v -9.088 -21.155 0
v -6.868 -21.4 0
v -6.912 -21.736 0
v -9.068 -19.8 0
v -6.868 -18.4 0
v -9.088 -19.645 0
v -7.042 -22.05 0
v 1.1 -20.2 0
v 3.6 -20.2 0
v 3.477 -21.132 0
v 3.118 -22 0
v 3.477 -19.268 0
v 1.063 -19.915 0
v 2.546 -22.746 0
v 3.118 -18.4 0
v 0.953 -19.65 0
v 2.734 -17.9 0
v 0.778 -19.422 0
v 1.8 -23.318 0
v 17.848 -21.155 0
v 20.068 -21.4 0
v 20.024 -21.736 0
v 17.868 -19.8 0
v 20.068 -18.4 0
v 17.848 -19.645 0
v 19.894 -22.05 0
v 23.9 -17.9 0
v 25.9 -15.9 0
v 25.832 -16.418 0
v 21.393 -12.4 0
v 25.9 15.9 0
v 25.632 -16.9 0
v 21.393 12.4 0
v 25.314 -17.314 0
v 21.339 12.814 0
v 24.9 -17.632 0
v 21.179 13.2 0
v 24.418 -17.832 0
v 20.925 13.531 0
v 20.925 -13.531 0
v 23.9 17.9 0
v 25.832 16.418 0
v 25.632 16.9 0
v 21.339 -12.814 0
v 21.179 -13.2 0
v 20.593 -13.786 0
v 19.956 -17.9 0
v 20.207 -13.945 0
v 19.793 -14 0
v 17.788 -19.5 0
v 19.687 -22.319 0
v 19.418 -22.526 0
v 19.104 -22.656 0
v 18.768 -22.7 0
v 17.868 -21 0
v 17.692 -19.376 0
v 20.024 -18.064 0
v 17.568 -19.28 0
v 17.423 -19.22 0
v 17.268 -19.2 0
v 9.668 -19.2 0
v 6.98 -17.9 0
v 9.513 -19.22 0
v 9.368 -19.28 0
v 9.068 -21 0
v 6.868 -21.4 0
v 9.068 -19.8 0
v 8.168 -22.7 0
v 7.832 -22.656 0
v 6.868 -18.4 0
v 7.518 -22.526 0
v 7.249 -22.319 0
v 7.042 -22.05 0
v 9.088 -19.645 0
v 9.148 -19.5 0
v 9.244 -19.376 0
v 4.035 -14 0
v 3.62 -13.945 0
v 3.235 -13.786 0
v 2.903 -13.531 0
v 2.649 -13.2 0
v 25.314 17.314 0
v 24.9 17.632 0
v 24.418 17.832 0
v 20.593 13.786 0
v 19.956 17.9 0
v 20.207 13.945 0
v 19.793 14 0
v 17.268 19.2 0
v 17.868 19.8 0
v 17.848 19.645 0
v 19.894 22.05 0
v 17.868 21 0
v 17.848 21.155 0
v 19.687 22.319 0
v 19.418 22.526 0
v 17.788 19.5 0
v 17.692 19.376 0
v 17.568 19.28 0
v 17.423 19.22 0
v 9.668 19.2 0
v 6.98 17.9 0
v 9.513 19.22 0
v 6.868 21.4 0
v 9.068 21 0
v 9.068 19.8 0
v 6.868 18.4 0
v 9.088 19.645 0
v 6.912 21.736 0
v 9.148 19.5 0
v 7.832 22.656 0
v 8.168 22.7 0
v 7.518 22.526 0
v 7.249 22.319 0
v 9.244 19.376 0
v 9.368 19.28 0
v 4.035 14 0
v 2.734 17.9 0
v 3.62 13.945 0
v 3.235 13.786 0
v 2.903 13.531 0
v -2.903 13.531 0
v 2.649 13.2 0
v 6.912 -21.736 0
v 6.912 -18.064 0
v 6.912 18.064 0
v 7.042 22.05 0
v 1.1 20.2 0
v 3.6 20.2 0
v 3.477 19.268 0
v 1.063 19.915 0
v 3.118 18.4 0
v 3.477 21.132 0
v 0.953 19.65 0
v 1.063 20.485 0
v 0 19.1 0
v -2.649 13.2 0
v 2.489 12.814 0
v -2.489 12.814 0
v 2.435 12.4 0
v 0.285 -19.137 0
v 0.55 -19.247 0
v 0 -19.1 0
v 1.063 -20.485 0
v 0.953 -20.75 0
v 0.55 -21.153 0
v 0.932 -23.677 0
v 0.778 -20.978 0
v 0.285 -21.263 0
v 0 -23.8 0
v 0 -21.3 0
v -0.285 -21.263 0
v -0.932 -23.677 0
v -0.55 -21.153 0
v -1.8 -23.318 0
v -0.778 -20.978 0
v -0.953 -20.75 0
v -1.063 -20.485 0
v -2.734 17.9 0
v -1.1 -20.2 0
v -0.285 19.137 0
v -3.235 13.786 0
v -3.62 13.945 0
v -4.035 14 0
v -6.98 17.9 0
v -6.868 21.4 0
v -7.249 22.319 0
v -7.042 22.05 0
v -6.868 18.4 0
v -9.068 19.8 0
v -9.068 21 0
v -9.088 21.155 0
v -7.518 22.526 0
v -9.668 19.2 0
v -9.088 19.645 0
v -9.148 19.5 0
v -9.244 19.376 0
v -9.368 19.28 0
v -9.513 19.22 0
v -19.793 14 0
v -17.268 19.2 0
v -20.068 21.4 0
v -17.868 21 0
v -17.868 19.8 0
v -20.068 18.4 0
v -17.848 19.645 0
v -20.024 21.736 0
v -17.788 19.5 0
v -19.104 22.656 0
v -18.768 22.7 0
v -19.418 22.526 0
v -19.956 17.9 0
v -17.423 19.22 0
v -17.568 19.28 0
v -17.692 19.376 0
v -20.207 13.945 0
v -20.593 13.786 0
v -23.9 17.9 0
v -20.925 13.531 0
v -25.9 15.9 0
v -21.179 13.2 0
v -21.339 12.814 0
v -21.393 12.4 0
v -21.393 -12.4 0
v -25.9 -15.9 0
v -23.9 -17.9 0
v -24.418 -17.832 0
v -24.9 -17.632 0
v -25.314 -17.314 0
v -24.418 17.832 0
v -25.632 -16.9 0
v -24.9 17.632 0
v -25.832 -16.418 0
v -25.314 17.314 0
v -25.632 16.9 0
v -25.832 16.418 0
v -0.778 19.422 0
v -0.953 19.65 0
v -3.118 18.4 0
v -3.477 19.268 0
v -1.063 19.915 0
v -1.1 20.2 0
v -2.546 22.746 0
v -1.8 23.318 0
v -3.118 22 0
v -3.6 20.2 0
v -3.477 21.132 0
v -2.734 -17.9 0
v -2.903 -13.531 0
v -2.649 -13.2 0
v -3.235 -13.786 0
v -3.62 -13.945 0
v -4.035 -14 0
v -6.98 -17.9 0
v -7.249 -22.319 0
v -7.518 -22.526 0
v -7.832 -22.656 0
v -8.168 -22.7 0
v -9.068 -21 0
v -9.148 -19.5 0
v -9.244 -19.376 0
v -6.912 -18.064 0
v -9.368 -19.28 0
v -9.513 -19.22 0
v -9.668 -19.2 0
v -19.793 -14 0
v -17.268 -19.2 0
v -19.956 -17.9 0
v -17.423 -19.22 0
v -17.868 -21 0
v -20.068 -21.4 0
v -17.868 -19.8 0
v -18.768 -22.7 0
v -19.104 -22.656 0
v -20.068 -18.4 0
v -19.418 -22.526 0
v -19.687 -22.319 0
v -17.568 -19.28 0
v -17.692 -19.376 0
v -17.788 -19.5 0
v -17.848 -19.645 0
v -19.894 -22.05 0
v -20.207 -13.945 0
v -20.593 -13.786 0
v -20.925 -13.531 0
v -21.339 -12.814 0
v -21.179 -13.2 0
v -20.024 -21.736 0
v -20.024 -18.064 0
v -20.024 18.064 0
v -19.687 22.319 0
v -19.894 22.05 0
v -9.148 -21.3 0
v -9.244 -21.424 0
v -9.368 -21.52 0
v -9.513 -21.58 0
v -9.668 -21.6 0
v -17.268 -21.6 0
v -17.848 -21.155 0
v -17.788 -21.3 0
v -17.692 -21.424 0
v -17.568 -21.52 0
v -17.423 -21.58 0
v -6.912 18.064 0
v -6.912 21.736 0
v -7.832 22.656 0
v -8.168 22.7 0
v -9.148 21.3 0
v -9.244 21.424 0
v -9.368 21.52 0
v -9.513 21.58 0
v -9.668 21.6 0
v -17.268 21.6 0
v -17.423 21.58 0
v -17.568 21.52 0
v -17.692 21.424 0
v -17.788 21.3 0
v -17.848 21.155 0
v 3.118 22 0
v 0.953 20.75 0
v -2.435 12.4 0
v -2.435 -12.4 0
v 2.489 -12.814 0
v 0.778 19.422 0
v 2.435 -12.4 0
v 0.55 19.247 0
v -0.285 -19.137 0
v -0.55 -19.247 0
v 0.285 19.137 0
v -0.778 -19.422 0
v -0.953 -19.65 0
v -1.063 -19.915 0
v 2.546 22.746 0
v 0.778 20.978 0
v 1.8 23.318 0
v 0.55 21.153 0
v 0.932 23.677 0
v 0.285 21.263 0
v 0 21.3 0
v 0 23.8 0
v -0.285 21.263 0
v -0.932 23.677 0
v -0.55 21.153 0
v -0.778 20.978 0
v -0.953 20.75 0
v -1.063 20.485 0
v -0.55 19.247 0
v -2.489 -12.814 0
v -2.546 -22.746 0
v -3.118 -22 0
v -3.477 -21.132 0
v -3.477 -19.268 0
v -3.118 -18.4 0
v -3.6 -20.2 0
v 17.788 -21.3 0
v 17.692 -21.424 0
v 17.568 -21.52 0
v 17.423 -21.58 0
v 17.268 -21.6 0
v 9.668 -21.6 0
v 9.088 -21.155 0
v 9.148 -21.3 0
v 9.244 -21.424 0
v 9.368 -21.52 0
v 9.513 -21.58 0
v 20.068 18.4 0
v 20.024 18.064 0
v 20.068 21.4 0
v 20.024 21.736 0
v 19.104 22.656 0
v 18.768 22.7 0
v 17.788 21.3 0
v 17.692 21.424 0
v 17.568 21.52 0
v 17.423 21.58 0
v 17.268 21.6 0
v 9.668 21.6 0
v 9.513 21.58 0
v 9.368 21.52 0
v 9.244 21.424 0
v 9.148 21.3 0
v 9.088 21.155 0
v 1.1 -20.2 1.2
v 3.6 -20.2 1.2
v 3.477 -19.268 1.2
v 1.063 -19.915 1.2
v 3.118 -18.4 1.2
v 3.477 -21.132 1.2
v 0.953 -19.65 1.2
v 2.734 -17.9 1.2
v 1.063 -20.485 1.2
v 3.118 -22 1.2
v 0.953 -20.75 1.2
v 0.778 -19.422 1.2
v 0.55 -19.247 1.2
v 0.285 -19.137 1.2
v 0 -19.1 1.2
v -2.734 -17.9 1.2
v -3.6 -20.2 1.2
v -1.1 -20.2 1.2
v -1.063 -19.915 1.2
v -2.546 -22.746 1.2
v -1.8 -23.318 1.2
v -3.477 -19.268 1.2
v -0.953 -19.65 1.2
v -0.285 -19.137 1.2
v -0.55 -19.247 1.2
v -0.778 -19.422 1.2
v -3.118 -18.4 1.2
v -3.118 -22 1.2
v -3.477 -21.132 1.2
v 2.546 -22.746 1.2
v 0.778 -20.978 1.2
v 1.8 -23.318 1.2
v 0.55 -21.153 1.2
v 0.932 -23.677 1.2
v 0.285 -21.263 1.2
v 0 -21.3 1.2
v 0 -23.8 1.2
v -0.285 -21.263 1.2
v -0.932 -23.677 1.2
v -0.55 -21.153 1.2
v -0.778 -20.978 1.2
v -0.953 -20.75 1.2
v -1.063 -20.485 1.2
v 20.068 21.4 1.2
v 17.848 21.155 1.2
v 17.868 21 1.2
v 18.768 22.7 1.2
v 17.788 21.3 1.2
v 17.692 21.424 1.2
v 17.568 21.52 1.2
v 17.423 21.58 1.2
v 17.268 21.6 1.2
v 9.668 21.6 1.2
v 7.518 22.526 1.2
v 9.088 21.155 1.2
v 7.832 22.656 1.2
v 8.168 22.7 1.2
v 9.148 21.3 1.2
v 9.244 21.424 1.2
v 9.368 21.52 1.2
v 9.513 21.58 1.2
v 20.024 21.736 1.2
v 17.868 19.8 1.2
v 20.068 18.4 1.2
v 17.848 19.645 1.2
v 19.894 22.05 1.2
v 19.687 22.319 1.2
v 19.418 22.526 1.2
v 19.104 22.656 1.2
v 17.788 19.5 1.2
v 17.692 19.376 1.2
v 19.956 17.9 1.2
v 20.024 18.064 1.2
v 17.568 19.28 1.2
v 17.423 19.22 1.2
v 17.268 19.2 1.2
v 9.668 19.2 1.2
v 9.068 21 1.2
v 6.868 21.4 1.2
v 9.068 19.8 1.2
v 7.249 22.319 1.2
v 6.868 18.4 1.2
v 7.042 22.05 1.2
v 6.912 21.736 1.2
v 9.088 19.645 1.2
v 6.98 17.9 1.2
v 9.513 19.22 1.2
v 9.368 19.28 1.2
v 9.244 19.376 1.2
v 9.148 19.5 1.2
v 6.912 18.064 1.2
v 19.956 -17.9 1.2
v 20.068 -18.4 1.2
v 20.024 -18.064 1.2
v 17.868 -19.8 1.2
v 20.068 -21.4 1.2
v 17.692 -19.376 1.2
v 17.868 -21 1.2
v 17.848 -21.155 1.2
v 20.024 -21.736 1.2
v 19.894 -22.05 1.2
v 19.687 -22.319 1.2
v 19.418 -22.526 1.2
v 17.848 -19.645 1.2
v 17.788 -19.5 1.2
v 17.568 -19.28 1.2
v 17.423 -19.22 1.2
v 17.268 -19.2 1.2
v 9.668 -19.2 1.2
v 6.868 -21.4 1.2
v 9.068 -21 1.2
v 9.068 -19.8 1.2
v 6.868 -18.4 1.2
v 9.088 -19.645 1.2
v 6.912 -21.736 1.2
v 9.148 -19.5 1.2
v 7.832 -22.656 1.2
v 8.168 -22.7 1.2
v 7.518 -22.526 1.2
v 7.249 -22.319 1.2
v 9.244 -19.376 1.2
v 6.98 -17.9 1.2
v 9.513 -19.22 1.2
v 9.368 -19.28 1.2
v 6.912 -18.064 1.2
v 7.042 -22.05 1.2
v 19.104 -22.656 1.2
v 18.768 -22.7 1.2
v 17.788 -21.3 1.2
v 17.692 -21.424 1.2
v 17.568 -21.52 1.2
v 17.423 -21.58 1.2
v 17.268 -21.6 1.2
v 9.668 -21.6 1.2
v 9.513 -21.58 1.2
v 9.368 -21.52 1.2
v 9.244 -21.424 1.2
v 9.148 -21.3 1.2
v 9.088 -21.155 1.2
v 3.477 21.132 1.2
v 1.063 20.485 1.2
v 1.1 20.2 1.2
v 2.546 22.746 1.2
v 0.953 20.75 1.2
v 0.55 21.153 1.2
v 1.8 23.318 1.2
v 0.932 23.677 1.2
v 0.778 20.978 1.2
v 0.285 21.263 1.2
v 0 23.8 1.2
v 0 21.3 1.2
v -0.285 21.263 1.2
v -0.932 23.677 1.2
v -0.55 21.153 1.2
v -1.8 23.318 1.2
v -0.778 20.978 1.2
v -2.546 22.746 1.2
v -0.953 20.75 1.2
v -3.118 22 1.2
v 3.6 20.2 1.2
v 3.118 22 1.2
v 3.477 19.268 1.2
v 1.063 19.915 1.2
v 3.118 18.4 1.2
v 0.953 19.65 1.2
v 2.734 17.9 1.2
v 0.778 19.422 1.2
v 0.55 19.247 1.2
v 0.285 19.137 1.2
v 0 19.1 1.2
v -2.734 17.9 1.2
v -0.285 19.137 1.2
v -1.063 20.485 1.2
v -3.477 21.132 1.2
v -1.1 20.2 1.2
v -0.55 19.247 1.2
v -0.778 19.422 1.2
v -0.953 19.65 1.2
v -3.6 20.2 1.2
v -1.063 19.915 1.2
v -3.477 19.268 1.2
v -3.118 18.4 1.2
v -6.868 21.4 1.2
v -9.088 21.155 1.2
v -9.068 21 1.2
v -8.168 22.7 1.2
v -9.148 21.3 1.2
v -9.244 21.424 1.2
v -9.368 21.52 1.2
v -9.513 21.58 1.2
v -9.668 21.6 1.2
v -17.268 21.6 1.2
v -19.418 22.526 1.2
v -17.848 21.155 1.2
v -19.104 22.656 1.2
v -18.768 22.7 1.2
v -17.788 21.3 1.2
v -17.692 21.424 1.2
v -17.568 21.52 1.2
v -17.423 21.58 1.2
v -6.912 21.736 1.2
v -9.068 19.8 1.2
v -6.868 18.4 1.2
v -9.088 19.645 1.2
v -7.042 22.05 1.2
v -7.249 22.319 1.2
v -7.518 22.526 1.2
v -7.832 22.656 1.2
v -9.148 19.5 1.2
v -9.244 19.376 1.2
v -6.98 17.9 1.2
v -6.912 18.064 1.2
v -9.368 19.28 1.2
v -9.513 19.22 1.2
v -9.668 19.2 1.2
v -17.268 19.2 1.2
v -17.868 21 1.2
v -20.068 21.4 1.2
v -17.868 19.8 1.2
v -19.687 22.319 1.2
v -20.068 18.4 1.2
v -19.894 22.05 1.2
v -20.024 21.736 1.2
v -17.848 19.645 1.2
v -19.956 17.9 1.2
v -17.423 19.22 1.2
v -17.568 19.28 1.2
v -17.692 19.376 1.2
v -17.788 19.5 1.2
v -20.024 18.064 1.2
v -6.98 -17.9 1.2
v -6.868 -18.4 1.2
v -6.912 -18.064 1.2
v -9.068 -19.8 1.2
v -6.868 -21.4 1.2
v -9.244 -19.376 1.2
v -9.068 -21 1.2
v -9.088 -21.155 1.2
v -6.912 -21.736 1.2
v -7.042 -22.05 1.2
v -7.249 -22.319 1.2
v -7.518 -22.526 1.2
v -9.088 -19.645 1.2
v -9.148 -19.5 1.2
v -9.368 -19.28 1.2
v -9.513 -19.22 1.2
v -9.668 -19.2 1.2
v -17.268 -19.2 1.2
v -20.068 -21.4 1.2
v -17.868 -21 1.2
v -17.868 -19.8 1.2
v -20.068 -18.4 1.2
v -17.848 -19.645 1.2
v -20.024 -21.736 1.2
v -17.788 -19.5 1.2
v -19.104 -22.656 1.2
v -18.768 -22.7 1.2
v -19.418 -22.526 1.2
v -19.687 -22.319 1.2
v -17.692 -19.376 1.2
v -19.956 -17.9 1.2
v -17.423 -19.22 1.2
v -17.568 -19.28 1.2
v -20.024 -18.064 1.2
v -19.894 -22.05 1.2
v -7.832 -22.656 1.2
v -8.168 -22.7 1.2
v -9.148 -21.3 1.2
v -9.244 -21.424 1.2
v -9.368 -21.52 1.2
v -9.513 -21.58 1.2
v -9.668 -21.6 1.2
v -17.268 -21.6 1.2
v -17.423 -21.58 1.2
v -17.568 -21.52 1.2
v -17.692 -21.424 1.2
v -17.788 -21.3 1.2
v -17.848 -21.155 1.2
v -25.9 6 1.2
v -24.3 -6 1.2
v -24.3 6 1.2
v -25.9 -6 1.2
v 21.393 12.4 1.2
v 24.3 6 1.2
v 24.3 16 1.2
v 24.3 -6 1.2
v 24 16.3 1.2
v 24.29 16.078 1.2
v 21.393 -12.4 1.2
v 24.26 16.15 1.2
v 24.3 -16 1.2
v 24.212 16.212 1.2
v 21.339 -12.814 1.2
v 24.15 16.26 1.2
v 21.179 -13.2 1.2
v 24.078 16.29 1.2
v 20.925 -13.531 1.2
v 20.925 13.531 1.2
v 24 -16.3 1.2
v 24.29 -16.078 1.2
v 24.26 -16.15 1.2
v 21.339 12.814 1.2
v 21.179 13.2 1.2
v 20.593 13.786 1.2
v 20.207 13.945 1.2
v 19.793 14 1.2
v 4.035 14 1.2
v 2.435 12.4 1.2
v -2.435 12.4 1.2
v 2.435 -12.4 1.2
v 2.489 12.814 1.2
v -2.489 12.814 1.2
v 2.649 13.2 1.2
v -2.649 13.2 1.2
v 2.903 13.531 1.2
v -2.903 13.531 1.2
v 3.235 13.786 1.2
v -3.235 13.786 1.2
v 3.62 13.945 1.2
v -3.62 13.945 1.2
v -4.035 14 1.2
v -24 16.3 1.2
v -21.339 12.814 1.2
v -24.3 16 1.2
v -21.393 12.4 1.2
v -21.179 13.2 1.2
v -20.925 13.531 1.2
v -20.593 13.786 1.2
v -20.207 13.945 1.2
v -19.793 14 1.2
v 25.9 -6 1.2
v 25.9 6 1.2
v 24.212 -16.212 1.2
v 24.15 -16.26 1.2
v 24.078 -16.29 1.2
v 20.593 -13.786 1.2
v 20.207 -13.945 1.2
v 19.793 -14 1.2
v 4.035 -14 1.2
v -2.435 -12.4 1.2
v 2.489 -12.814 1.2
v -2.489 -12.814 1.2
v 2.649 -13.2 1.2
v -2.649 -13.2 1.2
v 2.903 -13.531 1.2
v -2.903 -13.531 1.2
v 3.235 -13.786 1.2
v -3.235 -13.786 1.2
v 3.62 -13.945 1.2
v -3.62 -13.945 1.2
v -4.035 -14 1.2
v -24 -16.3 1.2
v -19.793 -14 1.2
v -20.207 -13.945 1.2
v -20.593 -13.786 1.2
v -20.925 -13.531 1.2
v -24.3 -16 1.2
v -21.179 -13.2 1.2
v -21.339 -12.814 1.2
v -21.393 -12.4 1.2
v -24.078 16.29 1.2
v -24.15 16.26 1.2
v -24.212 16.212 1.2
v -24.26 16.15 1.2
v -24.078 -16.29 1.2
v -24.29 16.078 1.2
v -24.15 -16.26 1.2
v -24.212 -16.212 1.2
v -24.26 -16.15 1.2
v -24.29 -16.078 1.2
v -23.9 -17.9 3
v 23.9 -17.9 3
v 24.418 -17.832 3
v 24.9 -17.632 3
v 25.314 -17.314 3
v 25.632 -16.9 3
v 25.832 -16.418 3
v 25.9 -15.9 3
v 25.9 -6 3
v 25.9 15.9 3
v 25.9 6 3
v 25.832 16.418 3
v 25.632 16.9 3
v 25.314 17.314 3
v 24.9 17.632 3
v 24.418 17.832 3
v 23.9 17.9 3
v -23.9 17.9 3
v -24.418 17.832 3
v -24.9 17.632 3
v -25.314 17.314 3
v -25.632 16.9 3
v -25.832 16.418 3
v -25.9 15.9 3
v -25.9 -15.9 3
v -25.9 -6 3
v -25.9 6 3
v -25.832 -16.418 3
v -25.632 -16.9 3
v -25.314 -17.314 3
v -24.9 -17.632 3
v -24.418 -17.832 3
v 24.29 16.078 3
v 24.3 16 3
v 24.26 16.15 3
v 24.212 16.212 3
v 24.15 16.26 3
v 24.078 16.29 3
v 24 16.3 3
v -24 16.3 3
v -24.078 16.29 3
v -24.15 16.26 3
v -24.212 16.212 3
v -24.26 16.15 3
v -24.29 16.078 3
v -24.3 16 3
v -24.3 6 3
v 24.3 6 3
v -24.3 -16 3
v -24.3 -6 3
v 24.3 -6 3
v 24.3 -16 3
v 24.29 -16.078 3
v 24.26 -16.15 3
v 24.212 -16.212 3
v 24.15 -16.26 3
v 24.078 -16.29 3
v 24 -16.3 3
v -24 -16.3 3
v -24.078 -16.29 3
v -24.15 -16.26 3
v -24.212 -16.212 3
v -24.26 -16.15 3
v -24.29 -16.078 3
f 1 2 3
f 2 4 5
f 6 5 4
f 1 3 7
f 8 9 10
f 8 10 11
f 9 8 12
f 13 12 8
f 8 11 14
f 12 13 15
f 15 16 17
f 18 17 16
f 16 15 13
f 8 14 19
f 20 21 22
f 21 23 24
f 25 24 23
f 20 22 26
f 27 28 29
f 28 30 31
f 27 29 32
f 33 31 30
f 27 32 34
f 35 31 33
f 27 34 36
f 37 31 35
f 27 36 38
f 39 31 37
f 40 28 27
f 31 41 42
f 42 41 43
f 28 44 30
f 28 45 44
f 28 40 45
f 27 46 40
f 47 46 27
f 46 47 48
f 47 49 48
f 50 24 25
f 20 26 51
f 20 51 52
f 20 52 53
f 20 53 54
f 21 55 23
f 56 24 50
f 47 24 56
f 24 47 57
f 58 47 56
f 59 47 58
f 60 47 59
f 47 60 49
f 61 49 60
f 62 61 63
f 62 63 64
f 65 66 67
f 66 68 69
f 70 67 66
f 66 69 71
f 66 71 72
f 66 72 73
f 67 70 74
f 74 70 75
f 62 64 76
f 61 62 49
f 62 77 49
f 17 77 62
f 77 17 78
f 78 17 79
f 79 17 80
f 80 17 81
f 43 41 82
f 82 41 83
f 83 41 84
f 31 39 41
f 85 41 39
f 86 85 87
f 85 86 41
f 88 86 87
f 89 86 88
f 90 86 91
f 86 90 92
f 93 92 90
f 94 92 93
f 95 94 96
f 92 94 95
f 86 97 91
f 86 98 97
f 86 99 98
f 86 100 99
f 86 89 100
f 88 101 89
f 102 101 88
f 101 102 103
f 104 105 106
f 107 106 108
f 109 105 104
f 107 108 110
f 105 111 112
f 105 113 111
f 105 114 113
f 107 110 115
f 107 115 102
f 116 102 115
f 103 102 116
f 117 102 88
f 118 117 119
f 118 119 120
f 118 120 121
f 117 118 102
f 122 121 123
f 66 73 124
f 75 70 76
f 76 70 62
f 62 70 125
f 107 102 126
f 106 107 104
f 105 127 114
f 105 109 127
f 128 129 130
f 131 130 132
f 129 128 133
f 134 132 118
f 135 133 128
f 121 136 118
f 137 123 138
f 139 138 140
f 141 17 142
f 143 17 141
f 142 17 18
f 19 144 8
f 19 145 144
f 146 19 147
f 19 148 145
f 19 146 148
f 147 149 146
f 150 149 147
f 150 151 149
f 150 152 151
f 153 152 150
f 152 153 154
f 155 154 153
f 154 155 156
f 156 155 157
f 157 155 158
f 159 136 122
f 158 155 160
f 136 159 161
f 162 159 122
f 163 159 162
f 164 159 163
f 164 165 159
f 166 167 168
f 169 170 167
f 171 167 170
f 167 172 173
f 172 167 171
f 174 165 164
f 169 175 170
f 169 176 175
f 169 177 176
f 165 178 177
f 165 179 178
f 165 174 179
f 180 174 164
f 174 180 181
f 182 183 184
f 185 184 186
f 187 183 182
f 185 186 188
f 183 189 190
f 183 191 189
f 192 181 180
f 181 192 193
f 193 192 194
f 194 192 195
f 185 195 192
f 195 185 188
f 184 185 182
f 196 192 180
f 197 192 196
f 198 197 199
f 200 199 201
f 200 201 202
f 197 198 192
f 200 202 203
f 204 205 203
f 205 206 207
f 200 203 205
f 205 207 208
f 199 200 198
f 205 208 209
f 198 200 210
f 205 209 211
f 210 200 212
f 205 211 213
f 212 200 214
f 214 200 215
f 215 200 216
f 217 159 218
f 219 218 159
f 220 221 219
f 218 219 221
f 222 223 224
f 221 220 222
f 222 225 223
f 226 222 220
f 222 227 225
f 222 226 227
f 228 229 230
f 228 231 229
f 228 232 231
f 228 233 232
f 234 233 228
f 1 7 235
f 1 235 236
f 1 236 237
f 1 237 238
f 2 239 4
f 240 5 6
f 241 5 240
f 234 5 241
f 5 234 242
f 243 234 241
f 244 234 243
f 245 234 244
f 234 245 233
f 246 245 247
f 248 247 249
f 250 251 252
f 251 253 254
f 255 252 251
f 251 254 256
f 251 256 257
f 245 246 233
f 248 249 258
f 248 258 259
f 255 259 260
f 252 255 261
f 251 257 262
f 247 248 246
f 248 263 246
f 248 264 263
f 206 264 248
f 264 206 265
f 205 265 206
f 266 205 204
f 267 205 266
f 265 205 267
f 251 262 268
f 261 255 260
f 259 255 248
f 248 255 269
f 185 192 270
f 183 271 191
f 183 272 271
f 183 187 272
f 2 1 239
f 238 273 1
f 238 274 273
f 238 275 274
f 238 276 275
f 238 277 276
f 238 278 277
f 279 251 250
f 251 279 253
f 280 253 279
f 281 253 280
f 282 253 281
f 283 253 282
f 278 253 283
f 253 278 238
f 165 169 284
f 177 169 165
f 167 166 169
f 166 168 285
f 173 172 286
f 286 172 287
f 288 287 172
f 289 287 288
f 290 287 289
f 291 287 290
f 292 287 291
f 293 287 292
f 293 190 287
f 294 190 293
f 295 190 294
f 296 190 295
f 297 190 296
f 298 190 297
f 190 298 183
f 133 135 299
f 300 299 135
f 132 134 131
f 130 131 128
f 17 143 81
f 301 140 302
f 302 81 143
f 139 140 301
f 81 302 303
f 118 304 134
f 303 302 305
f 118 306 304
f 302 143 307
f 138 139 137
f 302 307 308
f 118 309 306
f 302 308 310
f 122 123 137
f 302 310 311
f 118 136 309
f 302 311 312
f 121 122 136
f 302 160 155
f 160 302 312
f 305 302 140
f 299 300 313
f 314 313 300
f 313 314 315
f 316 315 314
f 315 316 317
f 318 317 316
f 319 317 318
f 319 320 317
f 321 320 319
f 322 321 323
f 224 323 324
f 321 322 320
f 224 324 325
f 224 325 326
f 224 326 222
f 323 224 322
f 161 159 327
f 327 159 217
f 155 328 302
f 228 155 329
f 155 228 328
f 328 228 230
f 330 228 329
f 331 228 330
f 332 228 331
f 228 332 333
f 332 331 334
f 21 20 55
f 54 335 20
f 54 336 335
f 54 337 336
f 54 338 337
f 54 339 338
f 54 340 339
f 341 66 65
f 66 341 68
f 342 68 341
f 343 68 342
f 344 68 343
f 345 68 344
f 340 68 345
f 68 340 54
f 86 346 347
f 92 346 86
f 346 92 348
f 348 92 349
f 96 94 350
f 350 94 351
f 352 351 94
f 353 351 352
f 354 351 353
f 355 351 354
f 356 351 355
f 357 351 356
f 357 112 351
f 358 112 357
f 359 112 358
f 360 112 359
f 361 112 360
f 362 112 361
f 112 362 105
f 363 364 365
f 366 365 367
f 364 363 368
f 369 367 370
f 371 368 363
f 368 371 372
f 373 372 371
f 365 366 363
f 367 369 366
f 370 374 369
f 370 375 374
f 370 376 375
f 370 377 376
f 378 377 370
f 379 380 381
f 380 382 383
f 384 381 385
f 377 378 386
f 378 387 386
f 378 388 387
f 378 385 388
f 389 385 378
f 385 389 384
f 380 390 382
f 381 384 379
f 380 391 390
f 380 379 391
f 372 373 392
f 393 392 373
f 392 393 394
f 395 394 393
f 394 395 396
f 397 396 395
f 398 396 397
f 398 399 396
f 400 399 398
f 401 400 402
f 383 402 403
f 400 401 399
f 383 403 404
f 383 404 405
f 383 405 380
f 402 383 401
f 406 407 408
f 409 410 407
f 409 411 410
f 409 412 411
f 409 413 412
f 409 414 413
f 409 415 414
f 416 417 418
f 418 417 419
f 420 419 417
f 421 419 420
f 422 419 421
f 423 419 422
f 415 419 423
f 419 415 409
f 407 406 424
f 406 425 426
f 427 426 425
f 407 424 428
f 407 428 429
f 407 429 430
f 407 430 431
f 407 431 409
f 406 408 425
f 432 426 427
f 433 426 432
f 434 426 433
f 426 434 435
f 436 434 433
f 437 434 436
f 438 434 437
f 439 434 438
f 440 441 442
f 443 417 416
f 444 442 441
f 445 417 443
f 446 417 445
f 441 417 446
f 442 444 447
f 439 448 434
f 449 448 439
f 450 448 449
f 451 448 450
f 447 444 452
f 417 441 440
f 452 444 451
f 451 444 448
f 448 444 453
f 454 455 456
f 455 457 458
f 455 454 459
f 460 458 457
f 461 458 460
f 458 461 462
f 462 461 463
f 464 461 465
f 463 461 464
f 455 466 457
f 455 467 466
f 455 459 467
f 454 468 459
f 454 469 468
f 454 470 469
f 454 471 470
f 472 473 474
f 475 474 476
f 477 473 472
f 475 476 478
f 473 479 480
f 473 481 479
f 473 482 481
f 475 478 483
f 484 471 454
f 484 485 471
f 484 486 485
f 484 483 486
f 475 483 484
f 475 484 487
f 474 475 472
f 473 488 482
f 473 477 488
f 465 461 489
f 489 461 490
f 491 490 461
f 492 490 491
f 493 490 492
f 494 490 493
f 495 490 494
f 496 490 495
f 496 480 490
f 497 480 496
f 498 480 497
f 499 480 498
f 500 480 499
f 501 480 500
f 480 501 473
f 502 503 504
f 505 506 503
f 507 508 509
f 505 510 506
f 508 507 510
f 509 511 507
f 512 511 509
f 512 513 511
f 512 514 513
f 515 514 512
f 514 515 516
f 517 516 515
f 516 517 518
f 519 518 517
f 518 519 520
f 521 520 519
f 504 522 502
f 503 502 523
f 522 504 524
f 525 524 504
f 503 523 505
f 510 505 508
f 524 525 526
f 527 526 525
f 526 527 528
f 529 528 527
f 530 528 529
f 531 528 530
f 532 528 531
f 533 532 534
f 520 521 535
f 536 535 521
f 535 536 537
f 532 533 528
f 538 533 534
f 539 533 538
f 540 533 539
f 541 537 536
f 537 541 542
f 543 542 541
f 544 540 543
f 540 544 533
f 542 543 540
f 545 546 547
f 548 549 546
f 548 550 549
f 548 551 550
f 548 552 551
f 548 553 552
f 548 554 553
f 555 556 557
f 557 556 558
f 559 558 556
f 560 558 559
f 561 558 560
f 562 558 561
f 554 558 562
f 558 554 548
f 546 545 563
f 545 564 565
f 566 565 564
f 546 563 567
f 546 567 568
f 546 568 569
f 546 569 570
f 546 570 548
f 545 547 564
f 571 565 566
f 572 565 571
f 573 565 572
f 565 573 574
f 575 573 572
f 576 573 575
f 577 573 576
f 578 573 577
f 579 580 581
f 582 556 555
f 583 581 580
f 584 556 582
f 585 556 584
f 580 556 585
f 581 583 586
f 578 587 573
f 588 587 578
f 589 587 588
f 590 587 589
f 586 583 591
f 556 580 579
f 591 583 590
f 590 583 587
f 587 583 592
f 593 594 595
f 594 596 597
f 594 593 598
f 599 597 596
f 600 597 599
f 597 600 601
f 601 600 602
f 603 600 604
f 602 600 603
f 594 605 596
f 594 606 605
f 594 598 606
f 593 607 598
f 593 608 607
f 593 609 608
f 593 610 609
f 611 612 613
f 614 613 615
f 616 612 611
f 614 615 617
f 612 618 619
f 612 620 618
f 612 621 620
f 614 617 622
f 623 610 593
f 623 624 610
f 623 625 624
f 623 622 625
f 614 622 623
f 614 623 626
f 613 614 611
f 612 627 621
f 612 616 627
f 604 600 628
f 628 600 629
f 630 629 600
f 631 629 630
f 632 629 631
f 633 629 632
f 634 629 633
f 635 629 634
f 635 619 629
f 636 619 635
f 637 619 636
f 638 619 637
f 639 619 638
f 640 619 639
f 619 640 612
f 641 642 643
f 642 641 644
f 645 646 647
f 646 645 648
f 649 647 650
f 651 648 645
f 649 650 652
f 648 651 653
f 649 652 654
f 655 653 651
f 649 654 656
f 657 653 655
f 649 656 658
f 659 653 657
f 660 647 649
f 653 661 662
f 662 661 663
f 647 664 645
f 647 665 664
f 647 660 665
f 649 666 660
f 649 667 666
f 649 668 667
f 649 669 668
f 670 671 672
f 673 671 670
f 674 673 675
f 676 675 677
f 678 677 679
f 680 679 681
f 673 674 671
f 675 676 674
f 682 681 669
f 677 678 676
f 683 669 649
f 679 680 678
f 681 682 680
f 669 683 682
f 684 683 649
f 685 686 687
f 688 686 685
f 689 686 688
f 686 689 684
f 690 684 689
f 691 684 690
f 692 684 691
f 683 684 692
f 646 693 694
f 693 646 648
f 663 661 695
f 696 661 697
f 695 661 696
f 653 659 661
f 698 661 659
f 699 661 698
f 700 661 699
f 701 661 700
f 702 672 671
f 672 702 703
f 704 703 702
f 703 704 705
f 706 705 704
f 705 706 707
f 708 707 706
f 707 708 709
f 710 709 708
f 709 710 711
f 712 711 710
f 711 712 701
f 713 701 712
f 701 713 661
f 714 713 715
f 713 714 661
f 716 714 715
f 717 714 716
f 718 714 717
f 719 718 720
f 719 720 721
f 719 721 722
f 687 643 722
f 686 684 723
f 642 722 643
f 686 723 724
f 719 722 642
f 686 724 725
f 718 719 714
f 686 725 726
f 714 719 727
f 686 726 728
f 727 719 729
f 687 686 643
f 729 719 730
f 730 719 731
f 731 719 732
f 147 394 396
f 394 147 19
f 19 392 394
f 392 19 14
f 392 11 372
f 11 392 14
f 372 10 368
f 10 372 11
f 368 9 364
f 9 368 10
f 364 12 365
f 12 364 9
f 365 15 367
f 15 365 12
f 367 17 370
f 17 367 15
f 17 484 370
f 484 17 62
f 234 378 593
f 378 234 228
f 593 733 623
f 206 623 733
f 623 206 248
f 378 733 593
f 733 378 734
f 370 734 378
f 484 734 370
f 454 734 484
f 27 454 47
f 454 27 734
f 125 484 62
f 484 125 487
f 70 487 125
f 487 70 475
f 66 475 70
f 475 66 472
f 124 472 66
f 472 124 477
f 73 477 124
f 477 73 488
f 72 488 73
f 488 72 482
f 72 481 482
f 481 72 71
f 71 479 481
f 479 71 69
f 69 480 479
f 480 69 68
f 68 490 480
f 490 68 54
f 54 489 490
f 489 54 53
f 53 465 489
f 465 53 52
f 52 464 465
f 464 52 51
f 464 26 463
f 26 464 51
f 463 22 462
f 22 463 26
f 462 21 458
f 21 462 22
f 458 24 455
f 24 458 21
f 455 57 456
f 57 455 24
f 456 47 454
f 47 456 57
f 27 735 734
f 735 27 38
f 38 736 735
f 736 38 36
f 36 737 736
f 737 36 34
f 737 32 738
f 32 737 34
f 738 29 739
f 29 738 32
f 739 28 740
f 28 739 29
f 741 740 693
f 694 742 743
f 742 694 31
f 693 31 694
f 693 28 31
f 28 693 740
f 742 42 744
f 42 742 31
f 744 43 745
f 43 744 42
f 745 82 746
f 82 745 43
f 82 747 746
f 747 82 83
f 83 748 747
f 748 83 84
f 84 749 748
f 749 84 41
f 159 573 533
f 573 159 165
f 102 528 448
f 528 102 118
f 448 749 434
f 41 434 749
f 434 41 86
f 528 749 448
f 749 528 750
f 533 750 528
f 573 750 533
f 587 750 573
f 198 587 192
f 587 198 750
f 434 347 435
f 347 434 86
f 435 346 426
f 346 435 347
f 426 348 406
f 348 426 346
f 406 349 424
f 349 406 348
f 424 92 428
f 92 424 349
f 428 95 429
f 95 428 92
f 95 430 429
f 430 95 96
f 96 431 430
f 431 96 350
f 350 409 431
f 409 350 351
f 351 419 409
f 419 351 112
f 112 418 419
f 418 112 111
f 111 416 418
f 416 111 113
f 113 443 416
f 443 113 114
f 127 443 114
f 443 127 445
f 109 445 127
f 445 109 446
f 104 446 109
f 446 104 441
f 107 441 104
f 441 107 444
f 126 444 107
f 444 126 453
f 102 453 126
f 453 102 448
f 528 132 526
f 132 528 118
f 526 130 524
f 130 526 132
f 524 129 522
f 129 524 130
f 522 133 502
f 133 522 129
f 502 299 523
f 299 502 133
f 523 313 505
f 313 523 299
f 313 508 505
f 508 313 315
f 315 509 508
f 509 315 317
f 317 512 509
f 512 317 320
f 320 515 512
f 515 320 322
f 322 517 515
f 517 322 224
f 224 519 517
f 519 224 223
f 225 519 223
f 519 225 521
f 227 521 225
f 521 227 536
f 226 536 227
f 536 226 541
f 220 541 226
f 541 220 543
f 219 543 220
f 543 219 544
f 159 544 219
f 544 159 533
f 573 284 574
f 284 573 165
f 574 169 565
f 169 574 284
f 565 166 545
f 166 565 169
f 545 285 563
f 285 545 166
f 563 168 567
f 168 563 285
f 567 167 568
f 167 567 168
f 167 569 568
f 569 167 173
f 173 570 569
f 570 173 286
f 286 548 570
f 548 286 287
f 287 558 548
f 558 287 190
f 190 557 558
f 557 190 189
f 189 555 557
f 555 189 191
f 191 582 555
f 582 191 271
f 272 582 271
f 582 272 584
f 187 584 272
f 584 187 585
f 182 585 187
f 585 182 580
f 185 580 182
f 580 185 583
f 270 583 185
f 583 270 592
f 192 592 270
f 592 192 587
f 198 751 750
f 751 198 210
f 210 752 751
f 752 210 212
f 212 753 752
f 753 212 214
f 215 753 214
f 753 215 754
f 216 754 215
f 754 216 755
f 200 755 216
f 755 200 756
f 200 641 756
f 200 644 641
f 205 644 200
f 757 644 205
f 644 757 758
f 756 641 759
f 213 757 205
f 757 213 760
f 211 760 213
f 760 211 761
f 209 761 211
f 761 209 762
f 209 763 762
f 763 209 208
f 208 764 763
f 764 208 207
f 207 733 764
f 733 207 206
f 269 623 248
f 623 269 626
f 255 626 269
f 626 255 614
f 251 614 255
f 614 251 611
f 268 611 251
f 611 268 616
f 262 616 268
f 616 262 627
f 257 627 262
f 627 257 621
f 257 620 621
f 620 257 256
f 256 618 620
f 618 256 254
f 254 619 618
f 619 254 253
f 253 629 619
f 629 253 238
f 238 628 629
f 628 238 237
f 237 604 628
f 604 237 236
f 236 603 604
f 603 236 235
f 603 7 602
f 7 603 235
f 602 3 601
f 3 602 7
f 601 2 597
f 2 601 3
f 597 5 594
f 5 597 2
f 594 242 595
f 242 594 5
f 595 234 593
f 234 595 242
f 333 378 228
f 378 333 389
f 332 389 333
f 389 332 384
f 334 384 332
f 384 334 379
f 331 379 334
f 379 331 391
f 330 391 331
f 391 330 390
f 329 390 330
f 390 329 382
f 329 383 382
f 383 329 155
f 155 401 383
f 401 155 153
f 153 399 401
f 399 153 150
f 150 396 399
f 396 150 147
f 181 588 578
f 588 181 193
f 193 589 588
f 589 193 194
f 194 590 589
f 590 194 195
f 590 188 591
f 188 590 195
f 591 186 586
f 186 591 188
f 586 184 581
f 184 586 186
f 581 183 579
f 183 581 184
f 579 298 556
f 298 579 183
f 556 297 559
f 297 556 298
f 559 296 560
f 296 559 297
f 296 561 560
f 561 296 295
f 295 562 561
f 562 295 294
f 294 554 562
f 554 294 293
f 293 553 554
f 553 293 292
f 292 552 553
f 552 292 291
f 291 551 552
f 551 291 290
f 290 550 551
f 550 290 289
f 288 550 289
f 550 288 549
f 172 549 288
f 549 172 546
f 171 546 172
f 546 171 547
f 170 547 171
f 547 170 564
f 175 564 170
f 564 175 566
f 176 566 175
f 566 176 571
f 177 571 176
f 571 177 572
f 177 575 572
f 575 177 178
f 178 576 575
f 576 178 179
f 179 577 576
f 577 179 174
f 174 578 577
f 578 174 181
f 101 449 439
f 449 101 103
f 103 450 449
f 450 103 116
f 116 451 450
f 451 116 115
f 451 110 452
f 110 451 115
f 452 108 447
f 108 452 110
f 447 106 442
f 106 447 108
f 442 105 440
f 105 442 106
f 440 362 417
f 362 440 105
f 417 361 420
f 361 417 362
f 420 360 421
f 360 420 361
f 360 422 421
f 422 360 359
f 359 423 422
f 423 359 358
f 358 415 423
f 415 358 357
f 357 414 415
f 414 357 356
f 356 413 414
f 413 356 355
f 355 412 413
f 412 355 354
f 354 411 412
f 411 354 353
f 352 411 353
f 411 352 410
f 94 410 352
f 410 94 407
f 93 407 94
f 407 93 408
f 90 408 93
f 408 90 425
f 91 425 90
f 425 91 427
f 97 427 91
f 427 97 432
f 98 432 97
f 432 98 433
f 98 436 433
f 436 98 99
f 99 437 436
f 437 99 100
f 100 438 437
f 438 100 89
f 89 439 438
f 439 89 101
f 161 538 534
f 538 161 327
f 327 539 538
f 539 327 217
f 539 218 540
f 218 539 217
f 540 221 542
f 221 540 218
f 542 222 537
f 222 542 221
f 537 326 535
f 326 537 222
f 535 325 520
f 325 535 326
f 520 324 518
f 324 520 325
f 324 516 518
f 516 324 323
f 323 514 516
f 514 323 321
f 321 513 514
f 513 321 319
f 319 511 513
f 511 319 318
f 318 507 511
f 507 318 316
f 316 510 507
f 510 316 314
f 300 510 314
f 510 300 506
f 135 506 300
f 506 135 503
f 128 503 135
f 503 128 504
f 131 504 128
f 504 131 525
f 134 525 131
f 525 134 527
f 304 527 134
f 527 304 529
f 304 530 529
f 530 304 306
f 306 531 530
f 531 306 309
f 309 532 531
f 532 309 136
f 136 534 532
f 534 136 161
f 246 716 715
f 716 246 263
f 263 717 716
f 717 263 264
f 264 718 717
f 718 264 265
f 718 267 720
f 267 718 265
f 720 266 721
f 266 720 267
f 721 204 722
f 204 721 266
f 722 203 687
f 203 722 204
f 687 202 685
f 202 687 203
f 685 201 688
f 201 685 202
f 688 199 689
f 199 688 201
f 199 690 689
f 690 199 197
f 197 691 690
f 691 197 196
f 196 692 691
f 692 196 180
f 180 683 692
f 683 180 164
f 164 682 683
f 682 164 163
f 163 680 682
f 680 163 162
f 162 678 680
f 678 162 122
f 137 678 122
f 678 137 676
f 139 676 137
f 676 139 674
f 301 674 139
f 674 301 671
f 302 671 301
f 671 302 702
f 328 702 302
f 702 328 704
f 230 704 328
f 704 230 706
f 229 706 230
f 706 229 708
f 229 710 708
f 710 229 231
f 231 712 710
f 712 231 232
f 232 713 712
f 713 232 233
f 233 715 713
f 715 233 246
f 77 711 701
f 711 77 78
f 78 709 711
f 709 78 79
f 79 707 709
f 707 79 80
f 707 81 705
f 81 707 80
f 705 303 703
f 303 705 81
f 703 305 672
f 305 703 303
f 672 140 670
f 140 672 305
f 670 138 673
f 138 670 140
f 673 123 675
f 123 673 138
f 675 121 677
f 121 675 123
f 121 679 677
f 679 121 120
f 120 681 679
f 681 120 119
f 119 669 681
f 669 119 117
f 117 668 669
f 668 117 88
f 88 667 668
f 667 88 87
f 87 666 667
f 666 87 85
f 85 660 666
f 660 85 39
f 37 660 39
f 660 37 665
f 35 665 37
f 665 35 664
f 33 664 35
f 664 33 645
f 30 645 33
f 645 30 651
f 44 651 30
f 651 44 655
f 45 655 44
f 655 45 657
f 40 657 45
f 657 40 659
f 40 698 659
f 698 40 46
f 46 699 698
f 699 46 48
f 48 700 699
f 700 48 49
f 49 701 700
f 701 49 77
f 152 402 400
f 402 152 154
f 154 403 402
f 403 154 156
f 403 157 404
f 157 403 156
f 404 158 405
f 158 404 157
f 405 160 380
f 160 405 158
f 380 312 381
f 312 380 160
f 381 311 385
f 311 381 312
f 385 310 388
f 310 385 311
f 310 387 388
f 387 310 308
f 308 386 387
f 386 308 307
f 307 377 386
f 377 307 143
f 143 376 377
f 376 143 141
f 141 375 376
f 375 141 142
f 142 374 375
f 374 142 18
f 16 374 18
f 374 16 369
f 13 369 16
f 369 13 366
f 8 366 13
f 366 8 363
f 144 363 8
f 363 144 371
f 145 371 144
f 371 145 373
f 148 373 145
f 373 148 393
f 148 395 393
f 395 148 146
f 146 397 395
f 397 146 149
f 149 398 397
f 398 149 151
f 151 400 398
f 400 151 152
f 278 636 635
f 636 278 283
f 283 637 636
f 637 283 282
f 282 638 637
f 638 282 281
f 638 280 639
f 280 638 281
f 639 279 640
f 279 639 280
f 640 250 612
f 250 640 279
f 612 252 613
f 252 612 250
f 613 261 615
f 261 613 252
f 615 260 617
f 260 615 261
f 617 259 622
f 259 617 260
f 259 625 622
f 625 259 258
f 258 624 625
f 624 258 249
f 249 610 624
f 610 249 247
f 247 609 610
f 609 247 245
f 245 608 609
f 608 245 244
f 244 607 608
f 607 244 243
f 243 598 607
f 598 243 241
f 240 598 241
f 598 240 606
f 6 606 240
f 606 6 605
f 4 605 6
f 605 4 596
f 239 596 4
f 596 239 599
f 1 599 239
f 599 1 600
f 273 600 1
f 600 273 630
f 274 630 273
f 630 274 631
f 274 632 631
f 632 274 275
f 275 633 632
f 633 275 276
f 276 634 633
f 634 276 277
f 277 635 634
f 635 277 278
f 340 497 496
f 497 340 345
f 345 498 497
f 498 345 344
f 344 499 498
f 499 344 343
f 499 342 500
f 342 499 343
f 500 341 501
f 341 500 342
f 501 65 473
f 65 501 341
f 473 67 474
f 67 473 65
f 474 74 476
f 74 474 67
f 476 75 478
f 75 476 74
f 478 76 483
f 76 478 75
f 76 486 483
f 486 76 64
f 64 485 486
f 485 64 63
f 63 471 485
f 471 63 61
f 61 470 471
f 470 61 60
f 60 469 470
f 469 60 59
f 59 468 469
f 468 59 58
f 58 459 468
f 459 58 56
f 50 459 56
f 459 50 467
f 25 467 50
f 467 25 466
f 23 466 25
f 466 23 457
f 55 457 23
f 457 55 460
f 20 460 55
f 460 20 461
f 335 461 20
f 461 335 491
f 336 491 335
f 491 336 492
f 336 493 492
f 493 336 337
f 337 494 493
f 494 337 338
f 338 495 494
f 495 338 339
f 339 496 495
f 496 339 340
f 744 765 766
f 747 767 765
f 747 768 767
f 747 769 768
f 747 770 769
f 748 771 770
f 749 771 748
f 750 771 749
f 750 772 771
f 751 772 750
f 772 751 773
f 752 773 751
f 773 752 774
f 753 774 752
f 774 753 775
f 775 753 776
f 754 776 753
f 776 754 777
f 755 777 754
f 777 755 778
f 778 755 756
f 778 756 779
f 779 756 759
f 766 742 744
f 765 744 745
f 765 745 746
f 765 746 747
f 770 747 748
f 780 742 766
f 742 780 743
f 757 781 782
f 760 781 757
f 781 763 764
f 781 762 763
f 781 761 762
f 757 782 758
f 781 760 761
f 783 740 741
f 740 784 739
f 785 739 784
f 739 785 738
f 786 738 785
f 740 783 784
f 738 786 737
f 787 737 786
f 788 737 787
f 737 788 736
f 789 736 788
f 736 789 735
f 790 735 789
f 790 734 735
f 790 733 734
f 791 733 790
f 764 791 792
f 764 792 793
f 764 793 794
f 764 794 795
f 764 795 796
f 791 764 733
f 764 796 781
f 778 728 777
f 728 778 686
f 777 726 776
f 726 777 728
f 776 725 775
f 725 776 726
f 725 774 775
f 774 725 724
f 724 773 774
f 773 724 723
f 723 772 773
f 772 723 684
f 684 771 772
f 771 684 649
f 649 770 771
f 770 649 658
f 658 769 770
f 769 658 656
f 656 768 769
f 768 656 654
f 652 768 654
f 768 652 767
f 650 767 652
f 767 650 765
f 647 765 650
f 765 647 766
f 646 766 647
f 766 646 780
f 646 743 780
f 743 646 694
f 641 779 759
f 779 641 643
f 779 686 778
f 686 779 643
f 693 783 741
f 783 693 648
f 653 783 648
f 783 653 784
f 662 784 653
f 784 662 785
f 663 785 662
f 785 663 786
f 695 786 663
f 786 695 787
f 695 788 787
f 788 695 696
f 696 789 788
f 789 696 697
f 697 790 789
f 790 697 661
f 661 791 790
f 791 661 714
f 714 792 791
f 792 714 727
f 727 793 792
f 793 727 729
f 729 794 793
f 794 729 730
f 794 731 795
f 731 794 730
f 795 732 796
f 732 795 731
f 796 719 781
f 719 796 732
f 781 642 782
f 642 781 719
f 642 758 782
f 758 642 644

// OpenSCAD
// Half-open PETG battery tray, assembly-fit prototype. Dimensions in mm.
// X follows battery length (cable at -X), Y is across, Z is upwards.
// The battery body dimensions exclude the cable and plug.
pack_length = 48;
pack_width = 32;
pack_height = 12; // Fit reference. Battery is retained by a separate strap.
clearance = 0.3; // On each face in the XY plane.
rail = 1.6;
floor_thickness = 1.2;
total_height = 3.0;
strap_slot_length = 8.8;
strap_slot_width = 2.4;
mount_pitch = 40.4;
mount_hole_diameter = 2.2;
mount_pad_diameter = 7.2;
spacer_height = 4.5;
spacer_outer_diameter = 5.2;
spacer_inner_diameter = 2.2;
corner = 2.0;
epsilon = 0.025;
$fn = 24;

pocket_length = pack_length + 2 * clearance;
pocket_width = pack_width + 2 * clearance;
outer_length = pocket_length + 2 * rail;
outer_width = pocket_width + 2 * rail;
ear_x = outer_length * 0.26;
ear_y = outer_width / 2 + 2;
ear_length = strap_slot_length + 4.4;
ear_width = strap_slot_width + 3.2;
window_x = outer_length * 0.23;
window_length = outer_length * 0.366;
window_width = outer_width - 7.8;

module round_rect(length, width, radius) {
    offset(r = radius)
        square([length - 2 * radius, width - 2 * radius], center = true);
}

module floor_shape() {
    difference() {
        union() {
            round_rect(outer_length, outer_width, corner);
            for (x = [-ear_x, ear_x], y = [-ear_y, ear_y])
                translate([x, y]) round_rect(ear_length, ear_width, 1.3);
            for (y = [-mount_pitch / 2, mount_pitch / 2])
                translate([0, y]) circle(d = mount_pad_diameter);
        }
        for (x = [-window_x, window_x])
            translate([x, 0]) round_rect(window_length, window_width, 1.6);
        for (x = [-ear_x, ear_x], y = [-ear_y, ear_y])
            translate([x, y + sign(y) * 0.5])
                round_rect(strap_slot_length, strap_slot_width, 0.6);
        // M2 holes sit outside the battery body. Match donor supports before use.
        for (y = [-mount_pitch / 2, mount_pitch / 2])
            translate([0, y]) circle(d = mount_hole_diameter);
    }
}

module rails_shape() {
    difference() {
        round_rect(outer_length, outer_width, corner);
        round_rect(pocket_length, pocket_width, 0.3);
        // Open cable exit on the front rim and the opposite rim.
        for (x = [-outer_length / 2, outer_length / 2])
            translate([x, 0]) square([rail * 3, 12], center = true);
    }
}

assert(pack_length >= 34 && pack_width >= 22);
assert(total_height > floor_thickness && floor_thickness >= 1);
assert(mount_pitch / 2 - 2.0 >= pack_width / 2 + 1.0);
assert(mount_pitch / 2 - mount_pad_diameter / 2 < outer_width / 2);
assert(mount_pad_diameter > spacer_outer_diameter);

union() {
    linear_extrude(floor_thickness) floor_shape();
    translate([0, 0, floor_thickness - epsilon])
        linear_extrude(total_height - floor_thickness + epsilon) rails_shape();
}
